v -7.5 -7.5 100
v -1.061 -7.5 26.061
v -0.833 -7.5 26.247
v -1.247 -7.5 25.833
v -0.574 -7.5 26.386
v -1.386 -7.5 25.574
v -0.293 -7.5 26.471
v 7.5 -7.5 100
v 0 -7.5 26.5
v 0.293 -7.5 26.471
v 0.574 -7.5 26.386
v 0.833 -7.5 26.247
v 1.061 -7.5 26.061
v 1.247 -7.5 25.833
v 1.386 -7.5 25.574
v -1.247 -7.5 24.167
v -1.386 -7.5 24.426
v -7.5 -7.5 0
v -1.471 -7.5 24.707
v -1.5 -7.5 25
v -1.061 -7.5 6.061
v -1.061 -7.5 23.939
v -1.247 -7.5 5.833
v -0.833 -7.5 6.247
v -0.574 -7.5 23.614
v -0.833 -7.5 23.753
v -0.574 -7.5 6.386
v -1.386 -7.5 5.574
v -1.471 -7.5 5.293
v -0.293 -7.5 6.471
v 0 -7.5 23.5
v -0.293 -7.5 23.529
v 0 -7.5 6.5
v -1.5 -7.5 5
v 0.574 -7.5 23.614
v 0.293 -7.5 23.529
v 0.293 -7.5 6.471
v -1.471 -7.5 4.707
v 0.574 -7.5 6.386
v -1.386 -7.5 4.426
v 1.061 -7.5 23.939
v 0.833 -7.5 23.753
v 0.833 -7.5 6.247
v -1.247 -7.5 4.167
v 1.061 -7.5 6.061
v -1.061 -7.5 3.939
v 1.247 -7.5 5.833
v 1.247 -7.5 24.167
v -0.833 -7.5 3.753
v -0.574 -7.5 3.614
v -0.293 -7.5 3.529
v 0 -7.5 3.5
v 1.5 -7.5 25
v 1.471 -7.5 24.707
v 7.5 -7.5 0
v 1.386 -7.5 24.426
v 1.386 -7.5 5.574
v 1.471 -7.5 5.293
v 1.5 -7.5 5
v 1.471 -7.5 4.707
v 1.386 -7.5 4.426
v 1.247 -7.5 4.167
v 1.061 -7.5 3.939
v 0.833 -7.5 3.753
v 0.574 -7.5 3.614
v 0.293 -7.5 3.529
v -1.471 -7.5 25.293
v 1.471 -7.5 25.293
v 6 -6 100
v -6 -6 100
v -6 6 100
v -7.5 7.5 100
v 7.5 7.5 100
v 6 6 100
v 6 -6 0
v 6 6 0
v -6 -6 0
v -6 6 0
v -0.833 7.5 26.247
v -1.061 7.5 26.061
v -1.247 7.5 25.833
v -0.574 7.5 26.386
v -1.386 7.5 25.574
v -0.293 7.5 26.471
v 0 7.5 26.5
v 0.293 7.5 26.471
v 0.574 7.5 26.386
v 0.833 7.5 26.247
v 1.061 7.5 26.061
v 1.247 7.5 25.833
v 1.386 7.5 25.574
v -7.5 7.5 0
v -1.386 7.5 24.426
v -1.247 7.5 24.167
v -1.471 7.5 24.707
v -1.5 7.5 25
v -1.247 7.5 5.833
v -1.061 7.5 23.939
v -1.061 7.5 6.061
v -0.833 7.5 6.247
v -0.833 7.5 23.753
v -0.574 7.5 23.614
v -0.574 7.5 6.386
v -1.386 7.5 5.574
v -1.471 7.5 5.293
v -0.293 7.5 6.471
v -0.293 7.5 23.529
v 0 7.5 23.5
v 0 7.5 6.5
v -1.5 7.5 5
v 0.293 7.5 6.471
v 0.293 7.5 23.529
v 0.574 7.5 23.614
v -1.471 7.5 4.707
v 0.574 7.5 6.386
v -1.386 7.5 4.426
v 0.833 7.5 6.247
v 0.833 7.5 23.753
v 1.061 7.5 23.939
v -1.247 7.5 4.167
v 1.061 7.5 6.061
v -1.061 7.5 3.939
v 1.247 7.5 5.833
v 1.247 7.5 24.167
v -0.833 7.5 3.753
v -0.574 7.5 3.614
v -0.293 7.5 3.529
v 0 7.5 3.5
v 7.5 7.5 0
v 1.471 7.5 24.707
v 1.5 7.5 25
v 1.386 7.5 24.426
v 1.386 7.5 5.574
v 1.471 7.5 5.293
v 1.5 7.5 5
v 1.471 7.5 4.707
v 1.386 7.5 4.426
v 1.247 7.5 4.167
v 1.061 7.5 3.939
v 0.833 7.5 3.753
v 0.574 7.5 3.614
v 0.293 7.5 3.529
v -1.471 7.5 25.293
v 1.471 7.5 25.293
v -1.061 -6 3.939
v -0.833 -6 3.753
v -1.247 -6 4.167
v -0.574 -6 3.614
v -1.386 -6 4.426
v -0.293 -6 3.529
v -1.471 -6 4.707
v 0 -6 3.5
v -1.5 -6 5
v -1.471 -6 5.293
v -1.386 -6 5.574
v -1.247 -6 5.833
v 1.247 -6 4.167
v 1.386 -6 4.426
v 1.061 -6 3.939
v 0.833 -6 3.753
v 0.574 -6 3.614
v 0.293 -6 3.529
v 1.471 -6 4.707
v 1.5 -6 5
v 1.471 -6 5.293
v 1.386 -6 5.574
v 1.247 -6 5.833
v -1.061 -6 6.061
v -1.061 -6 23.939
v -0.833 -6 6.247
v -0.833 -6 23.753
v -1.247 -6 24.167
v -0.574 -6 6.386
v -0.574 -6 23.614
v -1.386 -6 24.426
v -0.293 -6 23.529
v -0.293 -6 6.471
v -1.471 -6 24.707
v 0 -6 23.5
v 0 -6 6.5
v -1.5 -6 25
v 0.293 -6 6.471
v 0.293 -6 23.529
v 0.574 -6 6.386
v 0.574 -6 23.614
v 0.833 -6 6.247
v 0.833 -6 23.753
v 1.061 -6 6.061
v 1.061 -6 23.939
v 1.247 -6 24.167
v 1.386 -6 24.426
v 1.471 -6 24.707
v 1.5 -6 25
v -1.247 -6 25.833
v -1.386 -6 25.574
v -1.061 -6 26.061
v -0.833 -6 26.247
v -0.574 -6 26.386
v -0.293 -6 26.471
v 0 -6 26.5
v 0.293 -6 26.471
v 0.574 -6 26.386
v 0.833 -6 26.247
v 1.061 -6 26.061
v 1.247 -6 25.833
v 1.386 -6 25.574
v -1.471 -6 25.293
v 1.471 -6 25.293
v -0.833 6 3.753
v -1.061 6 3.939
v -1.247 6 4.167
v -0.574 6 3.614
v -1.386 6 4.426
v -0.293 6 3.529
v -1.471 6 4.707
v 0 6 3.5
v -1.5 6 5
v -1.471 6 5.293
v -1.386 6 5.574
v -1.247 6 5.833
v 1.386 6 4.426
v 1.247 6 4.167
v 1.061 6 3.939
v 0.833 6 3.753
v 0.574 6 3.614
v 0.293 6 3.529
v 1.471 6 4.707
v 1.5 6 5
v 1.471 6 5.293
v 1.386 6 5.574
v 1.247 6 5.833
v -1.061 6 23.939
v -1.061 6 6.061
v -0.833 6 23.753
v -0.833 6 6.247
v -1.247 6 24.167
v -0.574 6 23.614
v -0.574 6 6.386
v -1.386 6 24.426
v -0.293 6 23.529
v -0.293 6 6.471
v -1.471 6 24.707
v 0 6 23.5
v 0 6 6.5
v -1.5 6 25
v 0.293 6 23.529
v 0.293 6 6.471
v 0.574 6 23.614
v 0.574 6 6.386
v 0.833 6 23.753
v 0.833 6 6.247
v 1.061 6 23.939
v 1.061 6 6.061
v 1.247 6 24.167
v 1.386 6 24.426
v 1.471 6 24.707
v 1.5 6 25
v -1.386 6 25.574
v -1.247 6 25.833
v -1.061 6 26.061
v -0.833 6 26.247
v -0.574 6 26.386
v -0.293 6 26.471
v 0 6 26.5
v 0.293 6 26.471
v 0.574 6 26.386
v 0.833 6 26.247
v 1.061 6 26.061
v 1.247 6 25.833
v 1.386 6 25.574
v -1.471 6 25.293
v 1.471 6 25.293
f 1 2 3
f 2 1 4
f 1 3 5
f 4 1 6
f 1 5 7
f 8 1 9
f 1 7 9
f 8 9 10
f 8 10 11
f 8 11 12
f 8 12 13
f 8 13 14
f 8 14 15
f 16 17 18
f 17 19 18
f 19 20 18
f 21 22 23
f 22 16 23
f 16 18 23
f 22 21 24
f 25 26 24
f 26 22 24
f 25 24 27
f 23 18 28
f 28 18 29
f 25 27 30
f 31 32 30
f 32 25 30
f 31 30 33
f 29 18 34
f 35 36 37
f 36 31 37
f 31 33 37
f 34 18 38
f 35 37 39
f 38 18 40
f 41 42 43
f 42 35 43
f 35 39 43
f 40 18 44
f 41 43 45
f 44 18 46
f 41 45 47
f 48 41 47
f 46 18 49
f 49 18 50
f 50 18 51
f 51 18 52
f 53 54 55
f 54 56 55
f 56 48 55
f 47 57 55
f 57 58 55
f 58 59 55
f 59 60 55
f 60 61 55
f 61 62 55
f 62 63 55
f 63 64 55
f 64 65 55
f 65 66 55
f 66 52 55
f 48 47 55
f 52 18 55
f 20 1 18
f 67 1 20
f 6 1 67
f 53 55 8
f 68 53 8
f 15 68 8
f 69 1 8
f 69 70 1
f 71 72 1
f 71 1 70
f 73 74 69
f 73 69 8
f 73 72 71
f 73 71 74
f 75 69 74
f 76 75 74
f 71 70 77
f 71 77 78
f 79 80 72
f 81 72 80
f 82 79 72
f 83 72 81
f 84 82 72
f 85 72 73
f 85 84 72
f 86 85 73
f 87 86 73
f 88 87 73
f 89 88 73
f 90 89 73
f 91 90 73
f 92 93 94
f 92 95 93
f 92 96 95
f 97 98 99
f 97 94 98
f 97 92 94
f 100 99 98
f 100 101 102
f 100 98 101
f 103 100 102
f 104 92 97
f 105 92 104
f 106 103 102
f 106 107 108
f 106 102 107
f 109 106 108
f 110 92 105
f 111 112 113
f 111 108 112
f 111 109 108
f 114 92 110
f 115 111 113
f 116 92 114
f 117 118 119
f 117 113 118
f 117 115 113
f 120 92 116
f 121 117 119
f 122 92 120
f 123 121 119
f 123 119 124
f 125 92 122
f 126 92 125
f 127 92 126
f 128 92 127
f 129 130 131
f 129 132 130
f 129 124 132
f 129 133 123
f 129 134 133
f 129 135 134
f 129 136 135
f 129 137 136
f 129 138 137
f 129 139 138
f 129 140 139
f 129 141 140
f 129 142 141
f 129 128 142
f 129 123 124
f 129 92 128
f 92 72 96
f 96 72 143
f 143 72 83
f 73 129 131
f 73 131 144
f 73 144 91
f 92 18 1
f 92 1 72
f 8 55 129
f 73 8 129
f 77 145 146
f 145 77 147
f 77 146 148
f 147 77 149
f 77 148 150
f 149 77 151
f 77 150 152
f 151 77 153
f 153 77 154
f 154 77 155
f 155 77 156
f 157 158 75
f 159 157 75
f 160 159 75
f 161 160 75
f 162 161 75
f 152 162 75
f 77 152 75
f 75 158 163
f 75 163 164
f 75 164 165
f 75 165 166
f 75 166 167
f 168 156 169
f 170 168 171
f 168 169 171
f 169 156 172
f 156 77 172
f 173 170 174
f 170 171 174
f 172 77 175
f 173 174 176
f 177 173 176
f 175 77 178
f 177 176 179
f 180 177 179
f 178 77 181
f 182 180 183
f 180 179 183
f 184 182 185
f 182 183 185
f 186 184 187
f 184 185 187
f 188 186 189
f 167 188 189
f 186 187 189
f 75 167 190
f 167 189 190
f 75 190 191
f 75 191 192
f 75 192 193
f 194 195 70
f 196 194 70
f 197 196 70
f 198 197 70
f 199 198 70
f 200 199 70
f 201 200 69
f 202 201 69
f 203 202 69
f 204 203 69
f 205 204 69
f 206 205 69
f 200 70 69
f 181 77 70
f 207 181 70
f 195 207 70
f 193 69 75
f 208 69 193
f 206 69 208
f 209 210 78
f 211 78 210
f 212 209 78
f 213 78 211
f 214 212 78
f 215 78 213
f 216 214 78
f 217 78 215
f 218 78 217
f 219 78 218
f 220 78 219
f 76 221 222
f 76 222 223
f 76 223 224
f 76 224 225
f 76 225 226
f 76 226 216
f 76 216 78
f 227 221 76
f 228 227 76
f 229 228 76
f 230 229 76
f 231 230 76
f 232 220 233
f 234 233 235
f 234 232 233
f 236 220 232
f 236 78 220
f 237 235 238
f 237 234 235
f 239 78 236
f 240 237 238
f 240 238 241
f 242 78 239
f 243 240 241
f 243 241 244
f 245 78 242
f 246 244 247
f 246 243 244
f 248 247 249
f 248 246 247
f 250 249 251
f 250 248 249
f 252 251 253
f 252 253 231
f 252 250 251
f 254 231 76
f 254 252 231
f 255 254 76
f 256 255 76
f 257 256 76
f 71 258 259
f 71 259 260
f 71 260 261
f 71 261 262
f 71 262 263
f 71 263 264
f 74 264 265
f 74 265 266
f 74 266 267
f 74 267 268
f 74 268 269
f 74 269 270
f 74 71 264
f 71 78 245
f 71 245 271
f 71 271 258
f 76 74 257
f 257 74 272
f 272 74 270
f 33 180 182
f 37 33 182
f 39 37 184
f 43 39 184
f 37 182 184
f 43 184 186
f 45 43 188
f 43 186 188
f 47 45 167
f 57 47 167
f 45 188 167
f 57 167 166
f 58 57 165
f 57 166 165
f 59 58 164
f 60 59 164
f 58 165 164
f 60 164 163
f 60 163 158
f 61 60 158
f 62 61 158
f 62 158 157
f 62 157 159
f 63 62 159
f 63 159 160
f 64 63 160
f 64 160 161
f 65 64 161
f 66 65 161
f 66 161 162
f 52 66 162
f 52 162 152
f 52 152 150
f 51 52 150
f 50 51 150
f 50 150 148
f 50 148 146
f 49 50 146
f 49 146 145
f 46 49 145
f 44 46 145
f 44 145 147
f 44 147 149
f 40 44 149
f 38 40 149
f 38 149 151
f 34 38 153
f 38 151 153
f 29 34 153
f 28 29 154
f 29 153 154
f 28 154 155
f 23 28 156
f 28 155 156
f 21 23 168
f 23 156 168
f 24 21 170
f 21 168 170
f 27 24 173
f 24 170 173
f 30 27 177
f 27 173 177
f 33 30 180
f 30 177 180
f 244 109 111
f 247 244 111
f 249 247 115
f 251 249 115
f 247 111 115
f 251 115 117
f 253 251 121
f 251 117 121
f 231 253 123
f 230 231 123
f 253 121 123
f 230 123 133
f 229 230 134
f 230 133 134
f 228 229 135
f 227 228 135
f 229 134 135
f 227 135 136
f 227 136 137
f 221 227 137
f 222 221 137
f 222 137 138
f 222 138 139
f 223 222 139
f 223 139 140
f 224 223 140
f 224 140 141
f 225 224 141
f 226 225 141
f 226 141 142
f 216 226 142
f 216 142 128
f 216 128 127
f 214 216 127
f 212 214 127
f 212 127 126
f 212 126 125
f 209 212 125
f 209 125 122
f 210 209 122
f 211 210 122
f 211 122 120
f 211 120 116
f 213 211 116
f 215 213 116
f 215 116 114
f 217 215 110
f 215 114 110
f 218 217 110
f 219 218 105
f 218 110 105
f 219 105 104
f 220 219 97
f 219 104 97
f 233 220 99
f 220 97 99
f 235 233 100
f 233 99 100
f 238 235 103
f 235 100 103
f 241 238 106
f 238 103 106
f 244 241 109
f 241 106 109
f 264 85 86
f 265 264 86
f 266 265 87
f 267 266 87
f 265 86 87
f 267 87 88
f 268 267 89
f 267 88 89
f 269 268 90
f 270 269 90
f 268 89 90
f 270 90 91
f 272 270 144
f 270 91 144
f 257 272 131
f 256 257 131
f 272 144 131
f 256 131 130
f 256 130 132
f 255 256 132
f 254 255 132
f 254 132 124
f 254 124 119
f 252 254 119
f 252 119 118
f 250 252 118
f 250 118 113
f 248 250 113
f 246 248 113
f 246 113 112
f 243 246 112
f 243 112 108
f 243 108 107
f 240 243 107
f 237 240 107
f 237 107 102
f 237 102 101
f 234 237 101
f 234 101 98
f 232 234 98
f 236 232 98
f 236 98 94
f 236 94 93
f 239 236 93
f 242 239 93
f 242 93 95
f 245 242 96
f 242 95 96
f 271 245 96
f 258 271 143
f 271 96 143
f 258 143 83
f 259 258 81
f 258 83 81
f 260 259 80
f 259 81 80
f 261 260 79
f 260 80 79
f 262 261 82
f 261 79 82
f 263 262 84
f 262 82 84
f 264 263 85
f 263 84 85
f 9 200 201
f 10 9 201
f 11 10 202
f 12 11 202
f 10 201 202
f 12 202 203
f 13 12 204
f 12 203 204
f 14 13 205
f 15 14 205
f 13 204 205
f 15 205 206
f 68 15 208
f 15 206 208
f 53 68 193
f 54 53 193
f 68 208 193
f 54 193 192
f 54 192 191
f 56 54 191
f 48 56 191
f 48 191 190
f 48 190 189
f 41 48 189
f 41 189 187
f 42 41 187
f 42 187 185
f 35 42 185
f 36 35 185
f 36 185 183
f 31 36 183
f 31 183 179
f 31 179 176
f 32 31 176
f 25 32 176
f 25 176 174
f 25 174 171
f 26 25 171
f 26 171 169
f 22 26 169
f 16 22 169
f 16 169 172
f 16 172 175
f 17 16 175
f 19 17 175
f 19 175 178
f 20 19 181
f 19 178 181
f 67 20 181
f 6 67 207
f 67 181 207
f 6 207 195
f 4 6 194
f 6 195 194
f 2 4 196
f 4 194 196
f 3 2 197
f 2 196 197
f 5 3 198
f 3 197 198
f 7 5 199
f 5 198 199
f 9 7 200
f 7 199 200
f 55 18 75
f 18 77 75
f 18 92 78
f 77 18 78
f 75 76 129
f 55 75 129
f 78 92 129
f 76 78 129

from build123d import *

# Parameters (mm, degrees)
ESQUISSE1_W                = 15
ESQUISSE1_H                = 15
EXTRUSION1_DEPTH           = 100
ESQUISSE2_W                = 12
ESQUISSE2_H                = 12
EXTRUSION2_DEPTH           = 101.560926806
ESQUISSE3_R                = 1.5
EXTRUSION3_DEPTH           = 102.396498953
R_P_TITION_LIN_AIRE1_COUNT = 2
R_P_TITION_LIN_AIRE1_PITCH = 20


with BuildPart() as part:
    # Esquisse1 → Extrusion1 (new body)
    with BuildSketch(Plane.XY):
        Rectangle(ESQUISSE1_W, ESQUISSE1_H)
    extrude(amount=EXTRUSION1_DEPTH)

    # Esquisse2 → Extrusion2 (cut, through all)
    with BuildSketch(Plane.XY.offset(100)):
        Rectangle(ESQUISSE2_W, ESQUISSE2_H)
    extrude(amount=-EXTRUSION2_DEPTH, mode=Mode.SUBTRACT)

    # Esquisse3 → Extrusion3 (cut, through all)
    with BuildSketch(Plane(origin=(0, 7.5, 0), x_dir=(1, 0, 0), z_dir=(0, 1, 0))):
        with Locations(Location((0, -5, 0), (0, 0, 270))):
            Circle(ESQUISSE3_R)
    extrusion3 = extrude(amount=-EXTRUSION3_DEPTH, mode=Mode.SUBTRACT)

    # Répétition linéaire1: Extrusion3 ×2
    with Locations(*[(0, 0, i * R_P_TITION_LIN_AIRE1_PITCH) for i in range(1, R_P_TITION_LIN_AIRE1_COUNT)]):
        add(extrusion3, mode=Mode.SUBTRACT)


solid = part.part
